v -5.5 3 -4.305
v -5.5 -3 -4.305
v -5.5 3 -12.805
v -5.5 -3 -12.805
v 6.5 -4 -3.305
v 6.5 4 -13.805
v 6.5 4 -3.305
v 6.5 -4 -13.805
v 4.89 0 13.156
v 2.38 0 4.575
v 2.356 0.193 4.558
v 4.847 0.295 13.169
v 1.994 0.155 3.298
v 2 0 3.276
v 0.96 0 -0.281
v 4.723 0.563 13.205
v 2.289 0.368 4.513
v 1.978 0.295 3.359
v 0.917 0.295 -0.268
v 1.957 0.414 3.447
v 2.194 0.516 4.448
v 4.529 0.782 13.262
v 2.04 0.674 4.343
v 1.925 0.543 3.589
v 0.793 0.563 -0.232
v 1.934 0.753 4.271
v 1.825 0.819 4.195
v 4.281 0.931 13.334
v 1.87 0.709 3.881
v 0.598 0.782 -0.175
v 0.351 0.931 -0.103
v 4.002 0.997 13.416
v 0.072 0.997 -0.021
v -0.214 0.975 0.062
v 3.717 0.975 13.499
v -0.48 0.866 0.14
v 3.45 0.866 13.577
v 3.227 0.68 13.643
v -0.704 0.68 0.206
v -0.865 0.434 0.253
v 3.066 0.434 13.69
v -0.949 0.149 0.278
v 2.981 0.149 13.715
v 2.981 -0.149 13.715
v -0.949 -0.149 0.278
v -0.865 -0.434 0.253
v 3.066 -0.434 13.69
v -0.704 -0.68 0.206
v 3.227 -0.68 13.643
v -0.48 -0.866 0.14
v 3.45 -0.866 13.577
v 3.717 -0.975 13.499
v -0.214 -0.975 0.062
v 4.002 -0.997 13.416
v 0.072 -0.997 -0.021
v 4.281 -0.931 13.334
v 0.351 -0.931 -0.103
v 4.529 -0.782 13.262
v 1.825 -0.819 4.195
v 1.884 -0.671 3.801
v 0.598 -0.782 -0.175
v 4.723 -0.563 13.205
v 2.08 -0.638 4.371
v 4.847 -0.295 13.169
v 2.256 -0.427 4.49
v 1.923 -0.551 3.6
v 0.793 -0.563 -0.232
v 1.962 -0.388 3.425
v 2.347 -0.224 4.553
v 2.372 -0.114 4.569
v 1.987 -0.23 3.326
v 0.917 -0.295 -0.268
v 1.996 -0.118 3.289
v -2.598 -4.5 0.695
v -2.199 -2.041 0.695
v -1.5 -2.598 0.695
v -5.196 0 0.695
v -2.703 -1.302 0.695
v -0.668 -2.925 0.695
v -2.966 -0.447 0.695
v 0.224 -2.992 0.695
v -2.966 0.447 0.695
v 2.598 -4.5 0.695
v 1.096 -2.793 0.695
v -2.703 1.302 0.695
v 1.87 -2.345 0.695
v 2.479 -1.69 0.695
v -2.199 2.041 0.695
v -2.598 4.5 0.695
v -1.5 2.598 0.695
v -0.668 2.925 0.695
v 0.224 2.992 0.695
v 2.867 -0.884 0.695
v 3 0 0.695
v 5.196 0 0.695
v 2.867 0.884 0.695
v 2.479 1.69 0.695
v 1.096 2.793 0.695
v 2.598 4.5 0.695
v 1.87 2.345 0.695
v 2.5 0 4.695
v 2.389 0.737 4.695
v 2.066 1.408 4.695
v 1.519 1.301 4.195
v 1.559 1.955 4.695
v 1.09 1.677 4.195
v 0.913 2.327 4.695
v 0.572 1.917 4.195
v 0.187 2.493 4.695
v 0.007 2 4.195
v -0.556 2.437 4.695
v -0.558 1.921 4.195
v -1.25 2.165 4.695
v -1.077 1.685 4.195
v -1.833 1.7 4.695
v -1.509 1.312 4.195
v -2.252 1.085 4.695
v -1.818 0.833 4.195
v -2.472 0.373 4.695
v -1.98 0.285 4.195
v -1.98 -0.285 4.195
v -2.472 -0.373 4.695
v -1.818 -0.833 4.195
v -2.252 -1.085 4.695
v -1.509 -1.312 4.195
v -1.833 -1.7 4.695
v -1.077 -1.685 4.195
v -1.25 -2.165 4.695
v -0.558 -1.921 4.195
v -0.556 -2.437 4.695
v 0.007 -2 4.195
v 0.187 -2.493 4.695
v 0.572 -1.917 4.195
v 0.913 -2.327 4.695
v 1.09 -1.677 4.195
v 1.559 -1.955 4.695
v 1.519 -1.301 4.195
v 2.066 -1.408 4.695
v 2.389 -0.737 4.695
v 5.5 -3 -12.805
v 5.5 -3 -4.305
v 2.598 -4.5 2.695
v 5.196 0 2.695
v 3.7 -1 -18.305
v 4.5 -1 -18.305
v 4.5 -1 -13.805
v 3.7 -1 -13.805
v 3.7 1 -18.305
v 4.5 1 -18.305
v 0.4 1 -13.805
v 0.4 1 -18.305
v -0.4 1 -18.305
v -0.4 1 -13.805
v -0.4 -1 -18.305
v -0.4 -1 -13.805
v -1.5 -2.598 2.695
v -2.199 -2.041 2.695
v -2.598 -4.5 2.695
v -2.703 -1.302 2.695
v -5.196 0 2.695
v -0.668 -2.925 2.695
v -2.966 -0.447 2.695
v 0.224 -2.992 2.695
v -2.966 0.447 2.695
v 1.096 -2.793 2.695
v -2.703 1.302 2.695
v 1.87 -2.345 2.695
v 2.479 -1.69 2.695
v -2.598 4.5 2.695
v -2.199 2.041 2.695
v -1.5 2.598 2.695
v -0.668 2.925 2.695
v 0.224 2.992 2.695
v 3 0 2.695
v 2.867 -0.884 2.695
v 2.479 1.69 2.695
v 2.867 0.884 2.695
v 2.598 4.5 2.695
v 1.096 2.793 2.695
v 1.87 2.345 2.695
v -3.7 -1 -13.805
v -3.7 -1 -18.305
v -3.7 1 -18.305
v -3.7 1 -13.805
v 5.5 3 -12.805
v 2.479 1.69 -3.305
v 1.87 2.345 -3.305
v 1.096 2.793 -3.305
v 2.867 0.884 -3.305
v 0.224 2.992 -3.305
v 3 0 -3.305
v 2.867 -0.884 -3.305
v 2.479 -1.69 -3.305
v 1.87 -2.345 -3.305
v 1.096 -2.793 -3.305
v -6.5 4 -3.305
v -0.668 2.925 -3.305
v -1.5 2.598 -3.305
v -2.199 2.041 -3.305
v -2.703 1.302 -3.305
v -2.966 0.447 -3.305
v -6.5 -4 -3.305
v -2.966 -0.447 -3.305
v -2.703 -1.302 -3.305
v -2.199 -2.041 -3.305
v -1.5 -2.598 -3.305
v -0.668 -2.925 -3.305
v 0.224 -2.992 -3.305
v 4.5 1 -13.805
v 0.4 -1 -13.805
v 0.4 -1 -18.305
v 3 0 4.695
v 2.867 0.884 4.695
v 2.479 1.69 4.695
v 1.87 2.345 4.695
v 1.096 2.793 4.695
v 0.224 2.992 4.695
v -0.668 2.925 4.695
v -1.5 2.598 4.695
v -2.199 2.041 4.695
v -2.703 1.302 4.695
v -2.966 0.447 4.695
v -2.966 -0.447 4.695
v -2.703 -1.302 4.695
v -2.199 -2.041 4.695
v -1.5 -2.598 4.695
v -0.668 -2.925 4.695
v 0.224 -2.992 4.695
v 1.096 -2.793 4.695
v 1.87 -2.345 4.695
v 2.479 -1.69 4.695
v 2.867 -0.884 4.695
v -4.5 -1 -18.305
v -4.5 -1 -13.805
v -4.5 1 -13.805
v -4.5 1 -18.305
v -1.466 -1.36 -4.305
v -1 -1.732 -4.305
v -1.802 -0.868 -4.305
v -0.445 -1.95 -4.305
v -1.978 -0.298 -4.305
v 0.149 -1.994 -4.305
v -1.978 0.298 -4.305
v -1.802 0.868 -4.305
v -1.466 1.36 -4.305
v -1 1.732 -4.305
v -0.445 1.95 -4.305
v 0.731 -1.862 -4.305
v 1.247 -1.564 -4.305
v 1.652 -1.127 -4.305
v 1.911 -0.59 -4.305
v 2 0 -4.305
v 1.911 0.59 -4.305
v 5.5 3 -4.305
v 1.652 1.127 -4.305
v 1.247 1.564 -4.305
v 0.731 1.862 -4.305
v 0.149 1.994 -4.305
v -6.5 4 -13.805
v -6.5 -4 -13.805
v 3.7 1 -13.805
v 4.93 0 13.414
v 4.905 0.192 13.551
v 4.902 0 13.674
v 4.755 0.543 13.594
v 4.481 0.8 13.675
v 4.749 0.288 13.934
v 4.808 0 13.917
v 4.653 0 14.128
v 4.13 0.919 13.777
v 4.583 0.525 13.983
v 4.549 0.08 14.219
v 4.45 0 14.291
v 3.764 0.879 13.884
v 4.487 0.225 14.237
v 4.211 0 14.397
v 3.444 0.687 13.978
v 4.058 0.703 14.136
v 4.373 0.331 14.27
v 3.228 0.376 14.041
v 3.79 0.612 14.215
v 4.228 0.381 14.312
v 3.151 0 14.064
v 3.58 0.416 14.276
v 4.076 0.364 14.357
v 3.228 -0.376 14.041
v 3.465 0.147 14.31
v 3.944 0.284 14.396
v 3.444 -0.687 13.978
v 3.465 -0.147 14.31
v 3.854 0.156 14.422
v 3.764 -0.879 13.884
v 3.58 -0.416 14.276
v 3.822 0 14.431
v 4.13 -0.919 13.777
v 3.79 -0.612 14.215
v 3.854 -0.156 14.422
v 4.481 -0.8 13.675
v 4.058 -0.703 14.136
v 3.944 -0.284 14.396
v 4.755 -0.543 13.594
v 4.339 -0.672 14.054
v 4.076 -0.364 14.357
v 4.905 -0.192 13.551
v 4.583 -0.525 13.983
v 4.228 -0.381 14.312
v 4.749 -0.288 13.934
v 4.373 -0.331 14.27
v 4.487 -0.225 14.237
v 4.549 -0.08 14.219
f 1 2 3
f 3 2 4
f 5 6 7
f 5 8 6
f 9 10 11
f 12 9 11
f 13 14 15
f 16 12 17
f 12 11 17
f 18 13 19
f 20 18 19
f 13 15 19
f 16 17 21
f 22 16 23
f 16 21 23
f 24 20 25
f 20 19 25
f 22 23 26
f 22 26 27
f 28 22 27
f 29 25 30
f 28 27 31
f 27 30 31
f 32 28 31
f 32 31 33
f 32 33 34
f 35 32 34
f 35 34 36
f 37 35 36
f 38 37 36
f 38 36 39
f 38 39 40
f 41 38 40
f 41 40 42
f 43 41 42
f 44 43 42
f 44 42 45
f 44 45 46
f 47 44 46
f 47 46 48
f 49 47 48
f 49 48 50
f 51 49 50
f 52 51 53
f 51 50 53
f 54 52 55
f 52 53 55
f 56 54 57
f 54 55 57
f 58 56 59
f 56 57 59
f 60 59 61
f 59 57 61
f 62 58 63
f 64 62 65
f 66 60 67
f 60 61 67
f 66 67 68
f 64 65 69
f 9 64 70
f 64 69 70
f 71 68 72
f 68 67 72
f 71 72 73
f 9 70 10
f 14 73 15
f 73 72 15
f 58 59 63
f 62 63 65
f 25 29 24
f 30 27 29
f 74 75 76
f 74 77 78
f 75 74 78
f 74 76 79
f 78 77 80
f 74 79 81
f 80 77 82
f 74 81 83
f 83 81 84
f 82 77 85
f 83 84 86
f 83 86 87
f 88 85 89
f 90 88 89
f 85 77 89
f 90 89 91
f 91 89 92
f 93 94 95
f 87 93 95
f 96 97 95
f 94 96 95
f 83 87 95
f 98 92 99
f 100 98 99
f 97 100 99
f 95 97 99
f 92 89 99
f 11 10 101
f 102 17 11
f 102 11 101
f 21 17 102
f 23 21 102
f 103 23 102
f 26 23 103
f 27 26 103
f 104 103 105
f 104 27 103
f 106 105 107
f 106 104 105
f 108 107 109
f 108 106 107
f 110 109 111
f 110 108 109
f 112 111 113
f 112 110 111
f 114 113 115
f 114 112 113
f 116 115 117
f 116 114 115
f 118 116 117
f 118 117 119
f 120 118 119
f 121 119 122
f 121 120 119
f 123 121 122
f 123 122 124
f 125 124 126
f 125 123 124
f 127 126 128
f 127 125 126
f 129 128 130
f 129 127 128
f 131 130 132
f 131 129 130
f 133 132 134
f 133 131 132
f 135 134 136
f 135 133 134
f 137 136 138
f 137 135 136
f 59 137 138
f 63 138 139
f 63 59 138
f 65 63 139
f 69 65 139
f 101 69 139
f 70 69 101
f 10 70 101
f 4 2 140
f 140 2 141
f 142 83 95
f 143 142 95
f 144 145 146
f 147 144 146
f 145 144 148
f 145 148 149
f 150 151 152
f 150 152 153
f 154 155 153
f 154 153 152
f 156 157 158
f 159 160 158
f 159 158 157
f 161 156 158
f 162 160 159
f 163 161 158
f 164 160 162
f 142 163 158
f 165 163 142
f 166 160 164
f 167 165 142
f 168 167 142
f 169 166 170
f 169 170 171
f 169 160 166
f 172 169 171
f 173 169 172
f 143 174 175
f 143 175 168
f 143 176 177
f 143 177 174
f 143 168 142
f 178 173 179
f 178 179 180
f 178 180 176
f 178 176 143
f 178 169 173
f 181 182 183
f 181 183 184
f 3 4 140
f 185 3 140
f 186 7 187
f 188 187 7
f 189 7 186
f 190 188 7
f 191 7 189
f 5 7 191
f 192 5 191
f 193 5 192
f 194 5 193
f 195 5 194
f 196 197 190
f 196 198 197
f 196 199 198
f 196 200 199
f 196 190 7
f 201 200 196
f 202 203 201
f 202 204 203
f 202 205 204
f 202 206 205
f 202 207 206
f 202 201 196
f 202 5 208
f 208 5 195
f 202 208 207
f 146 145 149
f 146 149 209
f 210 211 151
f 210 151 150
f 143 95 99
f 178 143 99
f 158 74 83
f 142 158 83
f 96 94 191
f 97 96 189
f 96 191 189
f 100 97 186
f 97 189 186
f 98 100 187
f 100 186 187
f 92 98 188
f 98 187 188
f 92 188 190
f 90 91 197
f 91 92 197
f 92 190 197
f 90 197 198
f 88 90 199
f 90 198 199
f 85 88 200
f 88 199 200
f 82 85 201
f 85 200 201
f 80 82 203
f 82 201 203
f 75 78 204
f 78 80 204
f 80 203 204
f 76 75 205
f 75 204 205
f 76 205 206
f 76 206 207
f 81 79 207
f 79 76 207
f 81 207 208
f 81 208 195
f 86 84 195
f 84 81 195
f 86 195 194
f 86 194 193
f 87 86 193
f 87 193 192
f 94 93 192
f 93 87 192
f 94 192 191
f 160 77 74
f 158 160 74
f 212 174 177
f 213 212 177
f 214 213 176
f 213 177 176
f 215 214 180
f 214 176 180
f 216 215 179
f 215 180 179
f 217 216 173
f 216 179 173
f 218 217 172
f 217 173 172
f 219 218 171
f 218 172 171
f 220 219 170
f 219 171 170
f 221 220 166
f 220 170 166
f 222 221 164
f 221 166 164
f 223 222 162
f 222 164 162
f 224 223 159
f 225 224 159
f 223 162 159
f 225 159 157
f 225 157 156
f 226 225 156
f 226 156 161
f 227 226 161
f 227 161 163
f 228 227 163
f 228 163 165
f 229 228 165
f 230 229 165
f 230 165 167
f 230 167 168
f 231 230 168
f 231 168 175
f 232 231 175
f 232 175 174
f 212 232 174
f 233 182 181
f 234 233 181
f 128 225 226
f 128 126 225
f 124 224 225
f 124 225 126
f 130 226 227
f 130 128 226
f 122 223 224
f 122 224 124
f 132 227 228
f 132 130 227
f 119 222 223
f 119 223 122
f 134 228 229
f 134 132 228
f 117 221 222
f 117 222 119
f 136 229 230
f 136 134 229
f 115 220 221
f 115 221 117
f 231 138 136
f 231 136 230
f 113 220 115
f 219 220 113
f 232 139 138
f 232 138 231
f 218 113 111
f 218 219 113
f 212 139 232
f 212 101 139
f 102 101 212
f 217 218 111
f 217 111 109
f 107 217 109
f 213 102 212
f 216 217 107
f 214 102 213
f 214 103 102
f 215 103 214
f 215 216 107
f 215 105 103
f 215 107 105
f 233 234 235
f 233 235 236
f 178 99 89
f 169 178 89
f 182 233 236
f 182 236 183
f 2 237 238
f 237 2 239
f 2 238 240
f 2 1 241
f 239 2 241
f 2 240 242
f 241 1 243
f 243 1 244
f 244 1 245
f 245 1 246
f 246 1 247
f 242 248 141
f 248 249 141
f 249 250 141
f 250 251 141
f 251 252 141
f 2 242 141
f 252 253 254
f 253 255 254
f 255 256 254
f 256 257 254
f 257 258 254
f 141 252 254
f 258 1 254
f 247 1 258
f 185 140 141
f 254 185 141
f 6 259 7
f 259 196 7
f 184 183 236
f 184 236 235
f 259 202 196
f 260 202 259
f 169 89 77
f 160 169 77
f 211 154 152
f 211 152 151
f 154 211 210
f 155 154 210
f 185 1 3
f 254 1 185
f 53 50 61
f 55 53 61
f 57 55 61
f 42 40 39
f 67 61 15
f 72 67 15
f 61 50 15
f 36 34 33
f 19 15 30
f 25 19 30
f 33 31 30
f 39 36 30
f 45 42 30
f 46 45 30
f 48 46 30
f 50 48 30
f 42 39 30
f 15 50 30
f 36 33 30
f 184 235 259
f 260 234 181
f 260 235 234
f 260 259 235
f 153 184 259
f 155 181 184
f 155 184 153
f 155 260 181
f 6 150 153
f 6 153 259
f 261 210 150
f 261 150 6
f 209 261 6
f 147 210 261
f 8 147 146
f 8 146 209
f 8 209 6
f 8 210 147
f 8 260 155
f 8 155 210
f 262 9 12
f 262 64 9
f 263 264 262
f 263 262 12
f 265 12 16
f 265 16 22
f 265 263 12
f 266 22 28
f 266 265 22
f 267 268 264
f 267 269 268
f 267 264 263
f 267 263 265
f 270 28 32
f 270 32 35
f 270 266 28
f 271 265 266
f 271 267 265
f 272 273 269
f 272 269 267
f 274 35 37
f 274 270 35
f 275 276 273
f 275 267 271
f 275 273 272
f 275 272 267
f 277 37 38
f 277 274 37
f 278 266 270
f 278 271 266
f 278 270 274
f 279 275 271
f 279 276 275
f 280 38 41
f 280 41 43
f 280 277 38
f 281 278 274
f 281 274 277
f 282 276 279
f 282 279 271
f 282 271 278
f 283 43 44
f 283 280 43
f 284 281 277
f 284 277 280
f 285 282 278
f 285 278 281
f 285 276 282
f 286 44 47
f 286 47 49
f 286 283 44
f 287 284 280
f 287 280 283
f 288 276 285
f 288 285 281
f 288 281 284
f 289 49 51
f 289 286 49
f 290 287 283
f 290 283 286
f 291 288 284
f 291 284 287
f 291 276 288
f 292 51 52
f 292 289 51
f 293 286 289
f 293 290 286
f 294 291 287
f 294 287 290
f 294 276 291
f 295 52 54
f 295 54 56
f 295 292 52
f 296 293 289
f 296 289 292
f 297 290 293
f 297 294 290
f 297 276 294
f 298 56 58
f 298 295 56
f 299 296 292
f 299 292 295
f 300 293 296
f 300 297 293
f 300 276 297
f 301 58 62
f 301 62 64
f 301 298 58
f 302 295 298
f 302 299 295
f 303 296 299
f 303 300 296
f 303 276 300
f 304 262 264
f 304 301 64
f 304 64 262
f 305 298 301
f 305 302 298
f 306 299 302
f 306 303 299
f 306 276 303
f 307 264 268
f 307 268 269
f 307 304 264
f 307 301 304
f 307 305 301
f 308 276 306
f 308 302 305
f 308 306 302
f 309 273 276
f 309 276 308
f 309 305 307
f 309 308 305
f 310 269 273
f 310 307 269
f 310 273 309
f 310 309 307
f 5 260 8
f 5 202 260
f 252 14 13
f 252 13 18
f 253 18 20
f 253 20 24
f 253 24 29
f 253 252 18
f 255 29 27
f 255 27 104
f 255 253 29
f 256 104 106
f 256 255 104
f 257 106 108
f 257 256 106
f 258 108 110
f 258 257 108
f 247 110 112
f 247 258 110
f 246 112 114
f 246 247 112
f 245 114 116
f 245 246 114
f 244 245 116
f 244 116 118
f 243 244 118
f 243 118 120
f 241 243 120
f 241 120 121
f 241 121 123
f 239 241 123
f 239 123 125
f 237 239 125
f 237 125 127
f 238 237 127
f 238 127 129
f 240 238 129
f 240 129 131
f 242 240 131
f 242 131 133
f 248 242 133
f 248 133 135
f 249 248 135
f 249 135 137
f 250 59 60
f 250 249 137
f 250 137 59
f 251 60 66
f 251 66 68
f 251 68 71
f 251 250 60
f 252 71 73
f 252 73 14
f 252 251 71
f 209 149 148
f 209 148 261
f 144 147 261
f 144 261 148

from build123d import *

# Parameters (mm, degrees)
F1_DEPTH    = 4
F2_W        = 3
F2_H        = 4.5
F3_DEPTH    = 13.001
F4_R        = 3
F5_DEPTH    = 8
F8_DEPTH    = 2
F9_T        = 1
F9_T3_DEPTH = 2.8
F9_T5_DEPTH = 4
F9_T7_DEPTH = 2.8
F9_T9_DEPTH = 2.8
F11_SIZE    = 0.5
F13_R       = 1
F14_DEPTH   = 15
F15_R       = 1


# Not quite as in the source:
# - a shell that OpenCascade refuses in one call is made with other operations: the cavity is built on its own and cut out


with BuildPart() as f1:
    # F0 (on Front) → F1 (new body, symmetric)
    with BuildSketch(Plane.XZ):
        Polygon((6.5, -13.8051480774), (6.5, -3.3051480774), (-6.5, -3.3051480774), (-6.5, -13.8051480774), (-4.5, -13.8051480774), (-4.5, -18.3051480774), (-3.7, -18.3051480774), (-3.7, -13.8051480774), (-0.4, -13.8051480774), (-0.4, -18.3051480774), (0.4, -18.3051480774), (0.4, -13.8051480774), (3.7, -13.8051480774), (3.7, -18.3051480774), (4.5, -18.3051480774), (4.5, -13.8051480774), align=None)
    extrude(amount=F1_DEPTH, both=True)

    # F2 (on face) → F3 (cut, through all)
    with BuildSketch(Plane.YZ.offset(6.5)):
        with Locations((-2.5, -16.0551480774)):
            Rectangle(F2_W, F2_H)
        with Locations((2.5, -16.0551480774)):
            Rectangle(F2_W, F2_H)
    extrude(amount=-F3_DEPTH, mode=Mode.SUBTRACT)

    # F4 (on face) → F5 (join)
    with BuildSketch(Plane.XY.offset(-3.3051480774)):
        Circle(F4_R)
    extrude(amount=F5_DEPTH)

    # F7 (on offset) → F8 (join)
    with BuildSketch(Plane.XY.offset(0.6948519226)):
        Polygon((2.5980762114, -4.5), (5.1961524227, 0), (2.5980762114, 4.5), (-2.5980762114, 4.5), (-5.1961524227, 0), (-2.5980762114, -4.5), align=None)
    extrude(amount=F8_DEPTH)

    # F9: shell of thickness 1, made by hand


with BuildPart() as f9_core1:
    # F9_t2: copy of F1
    add(f1.part)

    # the walls: a layer under each face that stays
    f9_faces = [f9_core1.faces().sort_by_distance(p)[0] for p in [
        (-4.3333333333, 2.6666666667, -13.8051480774),
        (6.5, 0, -8.5551480774),
        (0, -4, -8.5551480774),
        (-6.5, 0, -8.5551480774),
        (0, 4, -8.5551480774),
        (0, 1, -16.0551480774),
        (-0.4, 0, -16.0551480774),
        (0, -1, -16.0551480774),
        (0.4, 0, -16.0551480774),
        (3.7, 0, -16.0551480774),
        (4.1, -1, -16.0551480774),
        (4.5, 0, -16.0551480774),
        (4.1, 1, -16.0551480774),
        (-4.1, 1, -16.0551480774),
        (-4.5, 0, -16.0551480774),
        (-4.1, -1, -16.0551480774),
        (-3.7, 0, -16.0551480774),
        (4.3333333333, 2.6666666667, -3.3051480774),
        (0, 0, -18.3051480774),
        (4.1, 0, -18.3051480774),
        (-4.1, 0, -18.3051480774),
        (-3, 0, -1.3051480774),
        (-3.4641016151, 0, 0.6948519226),
        (-3.897114317, -2.25, 1.6948519226),
        (-3.897114317, 2.25, 1.6948519226),
        (0, -4.5, 1.6948519226),
        (0, 4.5, 1.6948519226),
        (3.897114317, -2.25, 1.6948519226),
        (3.897114317, 2.25, 1.6948519226),
        (-3.4641016151, 0, 2.6948519226),
        (-3, 0, 3.6948519226),
    ]]
    thicken(f9_faces, amount=-F9_T, mode=Mode.SUBTRACT)

    # F9_s4 → F9_t3 (cut)
    with BuildSketch(Plane.YZ.offset(-1.4)):
        Polygon((1.01, -13.8151480774), (1, -12.8051480774), (0, -12.8051480774), (0, -13.8051480774), align=None)
        Polygon((-1.01, -13.8151480774), (-1, -12.8051480774), (0, -12.8051480774), (0, -13.8051480774), align=None)
    extrude(amount=F9_T3_DEPTH, mode=Mode.SUBTRACT)

    # F9_s6 → F9_t5 (cut)
    with BuildSketch(Plane.XZ.offset(-2)):
        Polygon((-0.41, -13.8151480774), (-0.4, -12.8051480774), (0.6, -12.8051480774), (0.6, -13.8051480774), align=None)
        Polygon((0.41, -13.8151480774), (0.4, -12.8051480774), (-0.6, -12.8051480774), (-0.6, -13.8051480774), align=None)
        Polygon((3.69, -13.8151480774), (3.7, -12.8051480774), (4.7, -12.8051480774), (4.7, -13.8051480774), align=None)
        Polygon((4.51, -13.8151480774), (4.5, -12.8051480774), (3.5, -12.8051480774), (3.5, -13.8051480774), align=None)
        Polygon((-4.51, -13.8151480774), (-4.5, -12.8051480774), (-3.5, -12.8051480774), (-3.5, -13.8051480774), align=None)
        Polygon((-3.69, -13.8151480774), (-3.7, -12.8051480774), (-4.7, -12.8051480774), (-4.7, -13.8051480774), align=None)
    extrude(amount=F9_T5_DEPTH, mode=Mode.SUBTRACT)

    # F9_s8 → F9_t7 (cut)
    with BuildSketch(Plane.YZ.offset(2.7)):
        Polygon((-1.01, -13.8151480774), (-1, -12.8051480774), (0, -12.8051480774), (0, -13.8051480774), align=None)
        Polygon((1.01, -13.8151480774), (1, -12.8051480774), (0, -12.8051480774), (0, -13.8051480774), align=None)
    extrude(amount=F9_T7_DEPTH, mode=Mode.SUBTRACT)

    # F9_s10 → F9_t9 (cut)
    with BuildSketch(Plane.YZ.offset(-5.5)):
        Polygon((1.01, -13.8151480774), (1, -12.8051480774), (0, -12.8051480774), (0, -13.8051480774), align=None)
        Polygon((-1.01, -13.8151480774), (-1, -12.8051480774), (0, -12.8051480774), (0, -13.8051480774), align=None)
    extrude(amount=F9_T9_DEPTH, mode=Mode.SUBTRACT)

    # F9_s11 → F9_t12 (revolve, cut)
    with BuildSketch(Plane.XZ):
        Polygon((3.01, -3.2951480774), (3, -4.3051480774), (2, -4.3051480774), (2, -3.3051480774), align=None)
    revolve(axis=Axis((0, 0, -3.3051480774), (0, 0, 1)), mode=Mode.SUBTRACT)

    # F9_s13 → F9_t14 (revolve, cut)
    with BuildSketch(Plane.XZ):
        Polygon((3.01, 0.6848519226), (2, 0.6948519226), (2, 1.6948519226), (3, 1.6948519226), align=None)
    revolve(axis=Axis((0, 0, 0.6948519226), (0, 0, -1)), mode=Mode.SUBTRACT)

    # F9_s15 → F9_t16 (revolve, cut)
    with BuildSketch(Plane.XZ):
        Polygon((3.01, 2.7048519226), (3, 1.6948519226), (2, 1.6948519226), (2, 2.6948519226), align=None)
    revolve(axis=Axis((0, 0, 2.6948519226), (0, 0, -1)), mode=Mode.SUBTRACT)


with BuildPart() as f1_1:
    add(f1.part)

    # what is left inside the walls is the cavity
    f9_cavity = [f9_core1.part.solids().sort_by_distance(p)[0] for p in [
        (0, 2.99, -9.971815),
    ]]
    add(f9_cavity, mode=Mode.SUBTRACT)

    # F11
    f11_edges = [f1_1.edges().sort_by_distance(p)[0] for p in [
        (-2, 0, 4.694852),
    ]]
    chamfer(f11_edges, length=F11_SIZE)

    # F13 (on line) → F14 (join)
    with BuildSketch(Plane(origin=(0, 0, 0), x_dir=(0.9597844806, 0, -0.2807378684), z_dir=(0.2807378684, 0, 0.9597844806))):
        Circle(F13_R)
    extrude(amount=F14_DEPTH)

    # F15
    f15_edges = [f1_1.edges().sort_by_distance(p)[0] for p in [
        (3.251284, 0, 14.677505),
    ]]
    fillet(f15_edges, radius=F15_R)


solid = f1_1.part
